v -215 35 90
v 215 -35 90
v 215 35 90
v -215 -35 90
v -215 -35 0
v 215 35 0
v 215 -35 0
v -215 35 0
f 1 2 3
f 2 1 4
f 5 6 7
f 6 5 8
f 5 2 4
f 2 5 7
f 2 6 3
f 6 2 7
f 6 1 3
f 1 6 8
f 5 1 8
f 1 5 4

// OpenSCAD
// Generated documentary F1 envelope proxy.
// Not manufacturing geometry, not dimensionally validated, not SimReady.
proxy_id = "993-INTERCOOLER-PRESSURE-HOSE-RIGHT";
$fn = 96;

length_mm = 430;
width_mm = 70;
height_mm = 90;

translate([-length_mm / 2, -width_mm / 2, 0])
    cube([length_mm, width_mm, height_mm], center = false);
